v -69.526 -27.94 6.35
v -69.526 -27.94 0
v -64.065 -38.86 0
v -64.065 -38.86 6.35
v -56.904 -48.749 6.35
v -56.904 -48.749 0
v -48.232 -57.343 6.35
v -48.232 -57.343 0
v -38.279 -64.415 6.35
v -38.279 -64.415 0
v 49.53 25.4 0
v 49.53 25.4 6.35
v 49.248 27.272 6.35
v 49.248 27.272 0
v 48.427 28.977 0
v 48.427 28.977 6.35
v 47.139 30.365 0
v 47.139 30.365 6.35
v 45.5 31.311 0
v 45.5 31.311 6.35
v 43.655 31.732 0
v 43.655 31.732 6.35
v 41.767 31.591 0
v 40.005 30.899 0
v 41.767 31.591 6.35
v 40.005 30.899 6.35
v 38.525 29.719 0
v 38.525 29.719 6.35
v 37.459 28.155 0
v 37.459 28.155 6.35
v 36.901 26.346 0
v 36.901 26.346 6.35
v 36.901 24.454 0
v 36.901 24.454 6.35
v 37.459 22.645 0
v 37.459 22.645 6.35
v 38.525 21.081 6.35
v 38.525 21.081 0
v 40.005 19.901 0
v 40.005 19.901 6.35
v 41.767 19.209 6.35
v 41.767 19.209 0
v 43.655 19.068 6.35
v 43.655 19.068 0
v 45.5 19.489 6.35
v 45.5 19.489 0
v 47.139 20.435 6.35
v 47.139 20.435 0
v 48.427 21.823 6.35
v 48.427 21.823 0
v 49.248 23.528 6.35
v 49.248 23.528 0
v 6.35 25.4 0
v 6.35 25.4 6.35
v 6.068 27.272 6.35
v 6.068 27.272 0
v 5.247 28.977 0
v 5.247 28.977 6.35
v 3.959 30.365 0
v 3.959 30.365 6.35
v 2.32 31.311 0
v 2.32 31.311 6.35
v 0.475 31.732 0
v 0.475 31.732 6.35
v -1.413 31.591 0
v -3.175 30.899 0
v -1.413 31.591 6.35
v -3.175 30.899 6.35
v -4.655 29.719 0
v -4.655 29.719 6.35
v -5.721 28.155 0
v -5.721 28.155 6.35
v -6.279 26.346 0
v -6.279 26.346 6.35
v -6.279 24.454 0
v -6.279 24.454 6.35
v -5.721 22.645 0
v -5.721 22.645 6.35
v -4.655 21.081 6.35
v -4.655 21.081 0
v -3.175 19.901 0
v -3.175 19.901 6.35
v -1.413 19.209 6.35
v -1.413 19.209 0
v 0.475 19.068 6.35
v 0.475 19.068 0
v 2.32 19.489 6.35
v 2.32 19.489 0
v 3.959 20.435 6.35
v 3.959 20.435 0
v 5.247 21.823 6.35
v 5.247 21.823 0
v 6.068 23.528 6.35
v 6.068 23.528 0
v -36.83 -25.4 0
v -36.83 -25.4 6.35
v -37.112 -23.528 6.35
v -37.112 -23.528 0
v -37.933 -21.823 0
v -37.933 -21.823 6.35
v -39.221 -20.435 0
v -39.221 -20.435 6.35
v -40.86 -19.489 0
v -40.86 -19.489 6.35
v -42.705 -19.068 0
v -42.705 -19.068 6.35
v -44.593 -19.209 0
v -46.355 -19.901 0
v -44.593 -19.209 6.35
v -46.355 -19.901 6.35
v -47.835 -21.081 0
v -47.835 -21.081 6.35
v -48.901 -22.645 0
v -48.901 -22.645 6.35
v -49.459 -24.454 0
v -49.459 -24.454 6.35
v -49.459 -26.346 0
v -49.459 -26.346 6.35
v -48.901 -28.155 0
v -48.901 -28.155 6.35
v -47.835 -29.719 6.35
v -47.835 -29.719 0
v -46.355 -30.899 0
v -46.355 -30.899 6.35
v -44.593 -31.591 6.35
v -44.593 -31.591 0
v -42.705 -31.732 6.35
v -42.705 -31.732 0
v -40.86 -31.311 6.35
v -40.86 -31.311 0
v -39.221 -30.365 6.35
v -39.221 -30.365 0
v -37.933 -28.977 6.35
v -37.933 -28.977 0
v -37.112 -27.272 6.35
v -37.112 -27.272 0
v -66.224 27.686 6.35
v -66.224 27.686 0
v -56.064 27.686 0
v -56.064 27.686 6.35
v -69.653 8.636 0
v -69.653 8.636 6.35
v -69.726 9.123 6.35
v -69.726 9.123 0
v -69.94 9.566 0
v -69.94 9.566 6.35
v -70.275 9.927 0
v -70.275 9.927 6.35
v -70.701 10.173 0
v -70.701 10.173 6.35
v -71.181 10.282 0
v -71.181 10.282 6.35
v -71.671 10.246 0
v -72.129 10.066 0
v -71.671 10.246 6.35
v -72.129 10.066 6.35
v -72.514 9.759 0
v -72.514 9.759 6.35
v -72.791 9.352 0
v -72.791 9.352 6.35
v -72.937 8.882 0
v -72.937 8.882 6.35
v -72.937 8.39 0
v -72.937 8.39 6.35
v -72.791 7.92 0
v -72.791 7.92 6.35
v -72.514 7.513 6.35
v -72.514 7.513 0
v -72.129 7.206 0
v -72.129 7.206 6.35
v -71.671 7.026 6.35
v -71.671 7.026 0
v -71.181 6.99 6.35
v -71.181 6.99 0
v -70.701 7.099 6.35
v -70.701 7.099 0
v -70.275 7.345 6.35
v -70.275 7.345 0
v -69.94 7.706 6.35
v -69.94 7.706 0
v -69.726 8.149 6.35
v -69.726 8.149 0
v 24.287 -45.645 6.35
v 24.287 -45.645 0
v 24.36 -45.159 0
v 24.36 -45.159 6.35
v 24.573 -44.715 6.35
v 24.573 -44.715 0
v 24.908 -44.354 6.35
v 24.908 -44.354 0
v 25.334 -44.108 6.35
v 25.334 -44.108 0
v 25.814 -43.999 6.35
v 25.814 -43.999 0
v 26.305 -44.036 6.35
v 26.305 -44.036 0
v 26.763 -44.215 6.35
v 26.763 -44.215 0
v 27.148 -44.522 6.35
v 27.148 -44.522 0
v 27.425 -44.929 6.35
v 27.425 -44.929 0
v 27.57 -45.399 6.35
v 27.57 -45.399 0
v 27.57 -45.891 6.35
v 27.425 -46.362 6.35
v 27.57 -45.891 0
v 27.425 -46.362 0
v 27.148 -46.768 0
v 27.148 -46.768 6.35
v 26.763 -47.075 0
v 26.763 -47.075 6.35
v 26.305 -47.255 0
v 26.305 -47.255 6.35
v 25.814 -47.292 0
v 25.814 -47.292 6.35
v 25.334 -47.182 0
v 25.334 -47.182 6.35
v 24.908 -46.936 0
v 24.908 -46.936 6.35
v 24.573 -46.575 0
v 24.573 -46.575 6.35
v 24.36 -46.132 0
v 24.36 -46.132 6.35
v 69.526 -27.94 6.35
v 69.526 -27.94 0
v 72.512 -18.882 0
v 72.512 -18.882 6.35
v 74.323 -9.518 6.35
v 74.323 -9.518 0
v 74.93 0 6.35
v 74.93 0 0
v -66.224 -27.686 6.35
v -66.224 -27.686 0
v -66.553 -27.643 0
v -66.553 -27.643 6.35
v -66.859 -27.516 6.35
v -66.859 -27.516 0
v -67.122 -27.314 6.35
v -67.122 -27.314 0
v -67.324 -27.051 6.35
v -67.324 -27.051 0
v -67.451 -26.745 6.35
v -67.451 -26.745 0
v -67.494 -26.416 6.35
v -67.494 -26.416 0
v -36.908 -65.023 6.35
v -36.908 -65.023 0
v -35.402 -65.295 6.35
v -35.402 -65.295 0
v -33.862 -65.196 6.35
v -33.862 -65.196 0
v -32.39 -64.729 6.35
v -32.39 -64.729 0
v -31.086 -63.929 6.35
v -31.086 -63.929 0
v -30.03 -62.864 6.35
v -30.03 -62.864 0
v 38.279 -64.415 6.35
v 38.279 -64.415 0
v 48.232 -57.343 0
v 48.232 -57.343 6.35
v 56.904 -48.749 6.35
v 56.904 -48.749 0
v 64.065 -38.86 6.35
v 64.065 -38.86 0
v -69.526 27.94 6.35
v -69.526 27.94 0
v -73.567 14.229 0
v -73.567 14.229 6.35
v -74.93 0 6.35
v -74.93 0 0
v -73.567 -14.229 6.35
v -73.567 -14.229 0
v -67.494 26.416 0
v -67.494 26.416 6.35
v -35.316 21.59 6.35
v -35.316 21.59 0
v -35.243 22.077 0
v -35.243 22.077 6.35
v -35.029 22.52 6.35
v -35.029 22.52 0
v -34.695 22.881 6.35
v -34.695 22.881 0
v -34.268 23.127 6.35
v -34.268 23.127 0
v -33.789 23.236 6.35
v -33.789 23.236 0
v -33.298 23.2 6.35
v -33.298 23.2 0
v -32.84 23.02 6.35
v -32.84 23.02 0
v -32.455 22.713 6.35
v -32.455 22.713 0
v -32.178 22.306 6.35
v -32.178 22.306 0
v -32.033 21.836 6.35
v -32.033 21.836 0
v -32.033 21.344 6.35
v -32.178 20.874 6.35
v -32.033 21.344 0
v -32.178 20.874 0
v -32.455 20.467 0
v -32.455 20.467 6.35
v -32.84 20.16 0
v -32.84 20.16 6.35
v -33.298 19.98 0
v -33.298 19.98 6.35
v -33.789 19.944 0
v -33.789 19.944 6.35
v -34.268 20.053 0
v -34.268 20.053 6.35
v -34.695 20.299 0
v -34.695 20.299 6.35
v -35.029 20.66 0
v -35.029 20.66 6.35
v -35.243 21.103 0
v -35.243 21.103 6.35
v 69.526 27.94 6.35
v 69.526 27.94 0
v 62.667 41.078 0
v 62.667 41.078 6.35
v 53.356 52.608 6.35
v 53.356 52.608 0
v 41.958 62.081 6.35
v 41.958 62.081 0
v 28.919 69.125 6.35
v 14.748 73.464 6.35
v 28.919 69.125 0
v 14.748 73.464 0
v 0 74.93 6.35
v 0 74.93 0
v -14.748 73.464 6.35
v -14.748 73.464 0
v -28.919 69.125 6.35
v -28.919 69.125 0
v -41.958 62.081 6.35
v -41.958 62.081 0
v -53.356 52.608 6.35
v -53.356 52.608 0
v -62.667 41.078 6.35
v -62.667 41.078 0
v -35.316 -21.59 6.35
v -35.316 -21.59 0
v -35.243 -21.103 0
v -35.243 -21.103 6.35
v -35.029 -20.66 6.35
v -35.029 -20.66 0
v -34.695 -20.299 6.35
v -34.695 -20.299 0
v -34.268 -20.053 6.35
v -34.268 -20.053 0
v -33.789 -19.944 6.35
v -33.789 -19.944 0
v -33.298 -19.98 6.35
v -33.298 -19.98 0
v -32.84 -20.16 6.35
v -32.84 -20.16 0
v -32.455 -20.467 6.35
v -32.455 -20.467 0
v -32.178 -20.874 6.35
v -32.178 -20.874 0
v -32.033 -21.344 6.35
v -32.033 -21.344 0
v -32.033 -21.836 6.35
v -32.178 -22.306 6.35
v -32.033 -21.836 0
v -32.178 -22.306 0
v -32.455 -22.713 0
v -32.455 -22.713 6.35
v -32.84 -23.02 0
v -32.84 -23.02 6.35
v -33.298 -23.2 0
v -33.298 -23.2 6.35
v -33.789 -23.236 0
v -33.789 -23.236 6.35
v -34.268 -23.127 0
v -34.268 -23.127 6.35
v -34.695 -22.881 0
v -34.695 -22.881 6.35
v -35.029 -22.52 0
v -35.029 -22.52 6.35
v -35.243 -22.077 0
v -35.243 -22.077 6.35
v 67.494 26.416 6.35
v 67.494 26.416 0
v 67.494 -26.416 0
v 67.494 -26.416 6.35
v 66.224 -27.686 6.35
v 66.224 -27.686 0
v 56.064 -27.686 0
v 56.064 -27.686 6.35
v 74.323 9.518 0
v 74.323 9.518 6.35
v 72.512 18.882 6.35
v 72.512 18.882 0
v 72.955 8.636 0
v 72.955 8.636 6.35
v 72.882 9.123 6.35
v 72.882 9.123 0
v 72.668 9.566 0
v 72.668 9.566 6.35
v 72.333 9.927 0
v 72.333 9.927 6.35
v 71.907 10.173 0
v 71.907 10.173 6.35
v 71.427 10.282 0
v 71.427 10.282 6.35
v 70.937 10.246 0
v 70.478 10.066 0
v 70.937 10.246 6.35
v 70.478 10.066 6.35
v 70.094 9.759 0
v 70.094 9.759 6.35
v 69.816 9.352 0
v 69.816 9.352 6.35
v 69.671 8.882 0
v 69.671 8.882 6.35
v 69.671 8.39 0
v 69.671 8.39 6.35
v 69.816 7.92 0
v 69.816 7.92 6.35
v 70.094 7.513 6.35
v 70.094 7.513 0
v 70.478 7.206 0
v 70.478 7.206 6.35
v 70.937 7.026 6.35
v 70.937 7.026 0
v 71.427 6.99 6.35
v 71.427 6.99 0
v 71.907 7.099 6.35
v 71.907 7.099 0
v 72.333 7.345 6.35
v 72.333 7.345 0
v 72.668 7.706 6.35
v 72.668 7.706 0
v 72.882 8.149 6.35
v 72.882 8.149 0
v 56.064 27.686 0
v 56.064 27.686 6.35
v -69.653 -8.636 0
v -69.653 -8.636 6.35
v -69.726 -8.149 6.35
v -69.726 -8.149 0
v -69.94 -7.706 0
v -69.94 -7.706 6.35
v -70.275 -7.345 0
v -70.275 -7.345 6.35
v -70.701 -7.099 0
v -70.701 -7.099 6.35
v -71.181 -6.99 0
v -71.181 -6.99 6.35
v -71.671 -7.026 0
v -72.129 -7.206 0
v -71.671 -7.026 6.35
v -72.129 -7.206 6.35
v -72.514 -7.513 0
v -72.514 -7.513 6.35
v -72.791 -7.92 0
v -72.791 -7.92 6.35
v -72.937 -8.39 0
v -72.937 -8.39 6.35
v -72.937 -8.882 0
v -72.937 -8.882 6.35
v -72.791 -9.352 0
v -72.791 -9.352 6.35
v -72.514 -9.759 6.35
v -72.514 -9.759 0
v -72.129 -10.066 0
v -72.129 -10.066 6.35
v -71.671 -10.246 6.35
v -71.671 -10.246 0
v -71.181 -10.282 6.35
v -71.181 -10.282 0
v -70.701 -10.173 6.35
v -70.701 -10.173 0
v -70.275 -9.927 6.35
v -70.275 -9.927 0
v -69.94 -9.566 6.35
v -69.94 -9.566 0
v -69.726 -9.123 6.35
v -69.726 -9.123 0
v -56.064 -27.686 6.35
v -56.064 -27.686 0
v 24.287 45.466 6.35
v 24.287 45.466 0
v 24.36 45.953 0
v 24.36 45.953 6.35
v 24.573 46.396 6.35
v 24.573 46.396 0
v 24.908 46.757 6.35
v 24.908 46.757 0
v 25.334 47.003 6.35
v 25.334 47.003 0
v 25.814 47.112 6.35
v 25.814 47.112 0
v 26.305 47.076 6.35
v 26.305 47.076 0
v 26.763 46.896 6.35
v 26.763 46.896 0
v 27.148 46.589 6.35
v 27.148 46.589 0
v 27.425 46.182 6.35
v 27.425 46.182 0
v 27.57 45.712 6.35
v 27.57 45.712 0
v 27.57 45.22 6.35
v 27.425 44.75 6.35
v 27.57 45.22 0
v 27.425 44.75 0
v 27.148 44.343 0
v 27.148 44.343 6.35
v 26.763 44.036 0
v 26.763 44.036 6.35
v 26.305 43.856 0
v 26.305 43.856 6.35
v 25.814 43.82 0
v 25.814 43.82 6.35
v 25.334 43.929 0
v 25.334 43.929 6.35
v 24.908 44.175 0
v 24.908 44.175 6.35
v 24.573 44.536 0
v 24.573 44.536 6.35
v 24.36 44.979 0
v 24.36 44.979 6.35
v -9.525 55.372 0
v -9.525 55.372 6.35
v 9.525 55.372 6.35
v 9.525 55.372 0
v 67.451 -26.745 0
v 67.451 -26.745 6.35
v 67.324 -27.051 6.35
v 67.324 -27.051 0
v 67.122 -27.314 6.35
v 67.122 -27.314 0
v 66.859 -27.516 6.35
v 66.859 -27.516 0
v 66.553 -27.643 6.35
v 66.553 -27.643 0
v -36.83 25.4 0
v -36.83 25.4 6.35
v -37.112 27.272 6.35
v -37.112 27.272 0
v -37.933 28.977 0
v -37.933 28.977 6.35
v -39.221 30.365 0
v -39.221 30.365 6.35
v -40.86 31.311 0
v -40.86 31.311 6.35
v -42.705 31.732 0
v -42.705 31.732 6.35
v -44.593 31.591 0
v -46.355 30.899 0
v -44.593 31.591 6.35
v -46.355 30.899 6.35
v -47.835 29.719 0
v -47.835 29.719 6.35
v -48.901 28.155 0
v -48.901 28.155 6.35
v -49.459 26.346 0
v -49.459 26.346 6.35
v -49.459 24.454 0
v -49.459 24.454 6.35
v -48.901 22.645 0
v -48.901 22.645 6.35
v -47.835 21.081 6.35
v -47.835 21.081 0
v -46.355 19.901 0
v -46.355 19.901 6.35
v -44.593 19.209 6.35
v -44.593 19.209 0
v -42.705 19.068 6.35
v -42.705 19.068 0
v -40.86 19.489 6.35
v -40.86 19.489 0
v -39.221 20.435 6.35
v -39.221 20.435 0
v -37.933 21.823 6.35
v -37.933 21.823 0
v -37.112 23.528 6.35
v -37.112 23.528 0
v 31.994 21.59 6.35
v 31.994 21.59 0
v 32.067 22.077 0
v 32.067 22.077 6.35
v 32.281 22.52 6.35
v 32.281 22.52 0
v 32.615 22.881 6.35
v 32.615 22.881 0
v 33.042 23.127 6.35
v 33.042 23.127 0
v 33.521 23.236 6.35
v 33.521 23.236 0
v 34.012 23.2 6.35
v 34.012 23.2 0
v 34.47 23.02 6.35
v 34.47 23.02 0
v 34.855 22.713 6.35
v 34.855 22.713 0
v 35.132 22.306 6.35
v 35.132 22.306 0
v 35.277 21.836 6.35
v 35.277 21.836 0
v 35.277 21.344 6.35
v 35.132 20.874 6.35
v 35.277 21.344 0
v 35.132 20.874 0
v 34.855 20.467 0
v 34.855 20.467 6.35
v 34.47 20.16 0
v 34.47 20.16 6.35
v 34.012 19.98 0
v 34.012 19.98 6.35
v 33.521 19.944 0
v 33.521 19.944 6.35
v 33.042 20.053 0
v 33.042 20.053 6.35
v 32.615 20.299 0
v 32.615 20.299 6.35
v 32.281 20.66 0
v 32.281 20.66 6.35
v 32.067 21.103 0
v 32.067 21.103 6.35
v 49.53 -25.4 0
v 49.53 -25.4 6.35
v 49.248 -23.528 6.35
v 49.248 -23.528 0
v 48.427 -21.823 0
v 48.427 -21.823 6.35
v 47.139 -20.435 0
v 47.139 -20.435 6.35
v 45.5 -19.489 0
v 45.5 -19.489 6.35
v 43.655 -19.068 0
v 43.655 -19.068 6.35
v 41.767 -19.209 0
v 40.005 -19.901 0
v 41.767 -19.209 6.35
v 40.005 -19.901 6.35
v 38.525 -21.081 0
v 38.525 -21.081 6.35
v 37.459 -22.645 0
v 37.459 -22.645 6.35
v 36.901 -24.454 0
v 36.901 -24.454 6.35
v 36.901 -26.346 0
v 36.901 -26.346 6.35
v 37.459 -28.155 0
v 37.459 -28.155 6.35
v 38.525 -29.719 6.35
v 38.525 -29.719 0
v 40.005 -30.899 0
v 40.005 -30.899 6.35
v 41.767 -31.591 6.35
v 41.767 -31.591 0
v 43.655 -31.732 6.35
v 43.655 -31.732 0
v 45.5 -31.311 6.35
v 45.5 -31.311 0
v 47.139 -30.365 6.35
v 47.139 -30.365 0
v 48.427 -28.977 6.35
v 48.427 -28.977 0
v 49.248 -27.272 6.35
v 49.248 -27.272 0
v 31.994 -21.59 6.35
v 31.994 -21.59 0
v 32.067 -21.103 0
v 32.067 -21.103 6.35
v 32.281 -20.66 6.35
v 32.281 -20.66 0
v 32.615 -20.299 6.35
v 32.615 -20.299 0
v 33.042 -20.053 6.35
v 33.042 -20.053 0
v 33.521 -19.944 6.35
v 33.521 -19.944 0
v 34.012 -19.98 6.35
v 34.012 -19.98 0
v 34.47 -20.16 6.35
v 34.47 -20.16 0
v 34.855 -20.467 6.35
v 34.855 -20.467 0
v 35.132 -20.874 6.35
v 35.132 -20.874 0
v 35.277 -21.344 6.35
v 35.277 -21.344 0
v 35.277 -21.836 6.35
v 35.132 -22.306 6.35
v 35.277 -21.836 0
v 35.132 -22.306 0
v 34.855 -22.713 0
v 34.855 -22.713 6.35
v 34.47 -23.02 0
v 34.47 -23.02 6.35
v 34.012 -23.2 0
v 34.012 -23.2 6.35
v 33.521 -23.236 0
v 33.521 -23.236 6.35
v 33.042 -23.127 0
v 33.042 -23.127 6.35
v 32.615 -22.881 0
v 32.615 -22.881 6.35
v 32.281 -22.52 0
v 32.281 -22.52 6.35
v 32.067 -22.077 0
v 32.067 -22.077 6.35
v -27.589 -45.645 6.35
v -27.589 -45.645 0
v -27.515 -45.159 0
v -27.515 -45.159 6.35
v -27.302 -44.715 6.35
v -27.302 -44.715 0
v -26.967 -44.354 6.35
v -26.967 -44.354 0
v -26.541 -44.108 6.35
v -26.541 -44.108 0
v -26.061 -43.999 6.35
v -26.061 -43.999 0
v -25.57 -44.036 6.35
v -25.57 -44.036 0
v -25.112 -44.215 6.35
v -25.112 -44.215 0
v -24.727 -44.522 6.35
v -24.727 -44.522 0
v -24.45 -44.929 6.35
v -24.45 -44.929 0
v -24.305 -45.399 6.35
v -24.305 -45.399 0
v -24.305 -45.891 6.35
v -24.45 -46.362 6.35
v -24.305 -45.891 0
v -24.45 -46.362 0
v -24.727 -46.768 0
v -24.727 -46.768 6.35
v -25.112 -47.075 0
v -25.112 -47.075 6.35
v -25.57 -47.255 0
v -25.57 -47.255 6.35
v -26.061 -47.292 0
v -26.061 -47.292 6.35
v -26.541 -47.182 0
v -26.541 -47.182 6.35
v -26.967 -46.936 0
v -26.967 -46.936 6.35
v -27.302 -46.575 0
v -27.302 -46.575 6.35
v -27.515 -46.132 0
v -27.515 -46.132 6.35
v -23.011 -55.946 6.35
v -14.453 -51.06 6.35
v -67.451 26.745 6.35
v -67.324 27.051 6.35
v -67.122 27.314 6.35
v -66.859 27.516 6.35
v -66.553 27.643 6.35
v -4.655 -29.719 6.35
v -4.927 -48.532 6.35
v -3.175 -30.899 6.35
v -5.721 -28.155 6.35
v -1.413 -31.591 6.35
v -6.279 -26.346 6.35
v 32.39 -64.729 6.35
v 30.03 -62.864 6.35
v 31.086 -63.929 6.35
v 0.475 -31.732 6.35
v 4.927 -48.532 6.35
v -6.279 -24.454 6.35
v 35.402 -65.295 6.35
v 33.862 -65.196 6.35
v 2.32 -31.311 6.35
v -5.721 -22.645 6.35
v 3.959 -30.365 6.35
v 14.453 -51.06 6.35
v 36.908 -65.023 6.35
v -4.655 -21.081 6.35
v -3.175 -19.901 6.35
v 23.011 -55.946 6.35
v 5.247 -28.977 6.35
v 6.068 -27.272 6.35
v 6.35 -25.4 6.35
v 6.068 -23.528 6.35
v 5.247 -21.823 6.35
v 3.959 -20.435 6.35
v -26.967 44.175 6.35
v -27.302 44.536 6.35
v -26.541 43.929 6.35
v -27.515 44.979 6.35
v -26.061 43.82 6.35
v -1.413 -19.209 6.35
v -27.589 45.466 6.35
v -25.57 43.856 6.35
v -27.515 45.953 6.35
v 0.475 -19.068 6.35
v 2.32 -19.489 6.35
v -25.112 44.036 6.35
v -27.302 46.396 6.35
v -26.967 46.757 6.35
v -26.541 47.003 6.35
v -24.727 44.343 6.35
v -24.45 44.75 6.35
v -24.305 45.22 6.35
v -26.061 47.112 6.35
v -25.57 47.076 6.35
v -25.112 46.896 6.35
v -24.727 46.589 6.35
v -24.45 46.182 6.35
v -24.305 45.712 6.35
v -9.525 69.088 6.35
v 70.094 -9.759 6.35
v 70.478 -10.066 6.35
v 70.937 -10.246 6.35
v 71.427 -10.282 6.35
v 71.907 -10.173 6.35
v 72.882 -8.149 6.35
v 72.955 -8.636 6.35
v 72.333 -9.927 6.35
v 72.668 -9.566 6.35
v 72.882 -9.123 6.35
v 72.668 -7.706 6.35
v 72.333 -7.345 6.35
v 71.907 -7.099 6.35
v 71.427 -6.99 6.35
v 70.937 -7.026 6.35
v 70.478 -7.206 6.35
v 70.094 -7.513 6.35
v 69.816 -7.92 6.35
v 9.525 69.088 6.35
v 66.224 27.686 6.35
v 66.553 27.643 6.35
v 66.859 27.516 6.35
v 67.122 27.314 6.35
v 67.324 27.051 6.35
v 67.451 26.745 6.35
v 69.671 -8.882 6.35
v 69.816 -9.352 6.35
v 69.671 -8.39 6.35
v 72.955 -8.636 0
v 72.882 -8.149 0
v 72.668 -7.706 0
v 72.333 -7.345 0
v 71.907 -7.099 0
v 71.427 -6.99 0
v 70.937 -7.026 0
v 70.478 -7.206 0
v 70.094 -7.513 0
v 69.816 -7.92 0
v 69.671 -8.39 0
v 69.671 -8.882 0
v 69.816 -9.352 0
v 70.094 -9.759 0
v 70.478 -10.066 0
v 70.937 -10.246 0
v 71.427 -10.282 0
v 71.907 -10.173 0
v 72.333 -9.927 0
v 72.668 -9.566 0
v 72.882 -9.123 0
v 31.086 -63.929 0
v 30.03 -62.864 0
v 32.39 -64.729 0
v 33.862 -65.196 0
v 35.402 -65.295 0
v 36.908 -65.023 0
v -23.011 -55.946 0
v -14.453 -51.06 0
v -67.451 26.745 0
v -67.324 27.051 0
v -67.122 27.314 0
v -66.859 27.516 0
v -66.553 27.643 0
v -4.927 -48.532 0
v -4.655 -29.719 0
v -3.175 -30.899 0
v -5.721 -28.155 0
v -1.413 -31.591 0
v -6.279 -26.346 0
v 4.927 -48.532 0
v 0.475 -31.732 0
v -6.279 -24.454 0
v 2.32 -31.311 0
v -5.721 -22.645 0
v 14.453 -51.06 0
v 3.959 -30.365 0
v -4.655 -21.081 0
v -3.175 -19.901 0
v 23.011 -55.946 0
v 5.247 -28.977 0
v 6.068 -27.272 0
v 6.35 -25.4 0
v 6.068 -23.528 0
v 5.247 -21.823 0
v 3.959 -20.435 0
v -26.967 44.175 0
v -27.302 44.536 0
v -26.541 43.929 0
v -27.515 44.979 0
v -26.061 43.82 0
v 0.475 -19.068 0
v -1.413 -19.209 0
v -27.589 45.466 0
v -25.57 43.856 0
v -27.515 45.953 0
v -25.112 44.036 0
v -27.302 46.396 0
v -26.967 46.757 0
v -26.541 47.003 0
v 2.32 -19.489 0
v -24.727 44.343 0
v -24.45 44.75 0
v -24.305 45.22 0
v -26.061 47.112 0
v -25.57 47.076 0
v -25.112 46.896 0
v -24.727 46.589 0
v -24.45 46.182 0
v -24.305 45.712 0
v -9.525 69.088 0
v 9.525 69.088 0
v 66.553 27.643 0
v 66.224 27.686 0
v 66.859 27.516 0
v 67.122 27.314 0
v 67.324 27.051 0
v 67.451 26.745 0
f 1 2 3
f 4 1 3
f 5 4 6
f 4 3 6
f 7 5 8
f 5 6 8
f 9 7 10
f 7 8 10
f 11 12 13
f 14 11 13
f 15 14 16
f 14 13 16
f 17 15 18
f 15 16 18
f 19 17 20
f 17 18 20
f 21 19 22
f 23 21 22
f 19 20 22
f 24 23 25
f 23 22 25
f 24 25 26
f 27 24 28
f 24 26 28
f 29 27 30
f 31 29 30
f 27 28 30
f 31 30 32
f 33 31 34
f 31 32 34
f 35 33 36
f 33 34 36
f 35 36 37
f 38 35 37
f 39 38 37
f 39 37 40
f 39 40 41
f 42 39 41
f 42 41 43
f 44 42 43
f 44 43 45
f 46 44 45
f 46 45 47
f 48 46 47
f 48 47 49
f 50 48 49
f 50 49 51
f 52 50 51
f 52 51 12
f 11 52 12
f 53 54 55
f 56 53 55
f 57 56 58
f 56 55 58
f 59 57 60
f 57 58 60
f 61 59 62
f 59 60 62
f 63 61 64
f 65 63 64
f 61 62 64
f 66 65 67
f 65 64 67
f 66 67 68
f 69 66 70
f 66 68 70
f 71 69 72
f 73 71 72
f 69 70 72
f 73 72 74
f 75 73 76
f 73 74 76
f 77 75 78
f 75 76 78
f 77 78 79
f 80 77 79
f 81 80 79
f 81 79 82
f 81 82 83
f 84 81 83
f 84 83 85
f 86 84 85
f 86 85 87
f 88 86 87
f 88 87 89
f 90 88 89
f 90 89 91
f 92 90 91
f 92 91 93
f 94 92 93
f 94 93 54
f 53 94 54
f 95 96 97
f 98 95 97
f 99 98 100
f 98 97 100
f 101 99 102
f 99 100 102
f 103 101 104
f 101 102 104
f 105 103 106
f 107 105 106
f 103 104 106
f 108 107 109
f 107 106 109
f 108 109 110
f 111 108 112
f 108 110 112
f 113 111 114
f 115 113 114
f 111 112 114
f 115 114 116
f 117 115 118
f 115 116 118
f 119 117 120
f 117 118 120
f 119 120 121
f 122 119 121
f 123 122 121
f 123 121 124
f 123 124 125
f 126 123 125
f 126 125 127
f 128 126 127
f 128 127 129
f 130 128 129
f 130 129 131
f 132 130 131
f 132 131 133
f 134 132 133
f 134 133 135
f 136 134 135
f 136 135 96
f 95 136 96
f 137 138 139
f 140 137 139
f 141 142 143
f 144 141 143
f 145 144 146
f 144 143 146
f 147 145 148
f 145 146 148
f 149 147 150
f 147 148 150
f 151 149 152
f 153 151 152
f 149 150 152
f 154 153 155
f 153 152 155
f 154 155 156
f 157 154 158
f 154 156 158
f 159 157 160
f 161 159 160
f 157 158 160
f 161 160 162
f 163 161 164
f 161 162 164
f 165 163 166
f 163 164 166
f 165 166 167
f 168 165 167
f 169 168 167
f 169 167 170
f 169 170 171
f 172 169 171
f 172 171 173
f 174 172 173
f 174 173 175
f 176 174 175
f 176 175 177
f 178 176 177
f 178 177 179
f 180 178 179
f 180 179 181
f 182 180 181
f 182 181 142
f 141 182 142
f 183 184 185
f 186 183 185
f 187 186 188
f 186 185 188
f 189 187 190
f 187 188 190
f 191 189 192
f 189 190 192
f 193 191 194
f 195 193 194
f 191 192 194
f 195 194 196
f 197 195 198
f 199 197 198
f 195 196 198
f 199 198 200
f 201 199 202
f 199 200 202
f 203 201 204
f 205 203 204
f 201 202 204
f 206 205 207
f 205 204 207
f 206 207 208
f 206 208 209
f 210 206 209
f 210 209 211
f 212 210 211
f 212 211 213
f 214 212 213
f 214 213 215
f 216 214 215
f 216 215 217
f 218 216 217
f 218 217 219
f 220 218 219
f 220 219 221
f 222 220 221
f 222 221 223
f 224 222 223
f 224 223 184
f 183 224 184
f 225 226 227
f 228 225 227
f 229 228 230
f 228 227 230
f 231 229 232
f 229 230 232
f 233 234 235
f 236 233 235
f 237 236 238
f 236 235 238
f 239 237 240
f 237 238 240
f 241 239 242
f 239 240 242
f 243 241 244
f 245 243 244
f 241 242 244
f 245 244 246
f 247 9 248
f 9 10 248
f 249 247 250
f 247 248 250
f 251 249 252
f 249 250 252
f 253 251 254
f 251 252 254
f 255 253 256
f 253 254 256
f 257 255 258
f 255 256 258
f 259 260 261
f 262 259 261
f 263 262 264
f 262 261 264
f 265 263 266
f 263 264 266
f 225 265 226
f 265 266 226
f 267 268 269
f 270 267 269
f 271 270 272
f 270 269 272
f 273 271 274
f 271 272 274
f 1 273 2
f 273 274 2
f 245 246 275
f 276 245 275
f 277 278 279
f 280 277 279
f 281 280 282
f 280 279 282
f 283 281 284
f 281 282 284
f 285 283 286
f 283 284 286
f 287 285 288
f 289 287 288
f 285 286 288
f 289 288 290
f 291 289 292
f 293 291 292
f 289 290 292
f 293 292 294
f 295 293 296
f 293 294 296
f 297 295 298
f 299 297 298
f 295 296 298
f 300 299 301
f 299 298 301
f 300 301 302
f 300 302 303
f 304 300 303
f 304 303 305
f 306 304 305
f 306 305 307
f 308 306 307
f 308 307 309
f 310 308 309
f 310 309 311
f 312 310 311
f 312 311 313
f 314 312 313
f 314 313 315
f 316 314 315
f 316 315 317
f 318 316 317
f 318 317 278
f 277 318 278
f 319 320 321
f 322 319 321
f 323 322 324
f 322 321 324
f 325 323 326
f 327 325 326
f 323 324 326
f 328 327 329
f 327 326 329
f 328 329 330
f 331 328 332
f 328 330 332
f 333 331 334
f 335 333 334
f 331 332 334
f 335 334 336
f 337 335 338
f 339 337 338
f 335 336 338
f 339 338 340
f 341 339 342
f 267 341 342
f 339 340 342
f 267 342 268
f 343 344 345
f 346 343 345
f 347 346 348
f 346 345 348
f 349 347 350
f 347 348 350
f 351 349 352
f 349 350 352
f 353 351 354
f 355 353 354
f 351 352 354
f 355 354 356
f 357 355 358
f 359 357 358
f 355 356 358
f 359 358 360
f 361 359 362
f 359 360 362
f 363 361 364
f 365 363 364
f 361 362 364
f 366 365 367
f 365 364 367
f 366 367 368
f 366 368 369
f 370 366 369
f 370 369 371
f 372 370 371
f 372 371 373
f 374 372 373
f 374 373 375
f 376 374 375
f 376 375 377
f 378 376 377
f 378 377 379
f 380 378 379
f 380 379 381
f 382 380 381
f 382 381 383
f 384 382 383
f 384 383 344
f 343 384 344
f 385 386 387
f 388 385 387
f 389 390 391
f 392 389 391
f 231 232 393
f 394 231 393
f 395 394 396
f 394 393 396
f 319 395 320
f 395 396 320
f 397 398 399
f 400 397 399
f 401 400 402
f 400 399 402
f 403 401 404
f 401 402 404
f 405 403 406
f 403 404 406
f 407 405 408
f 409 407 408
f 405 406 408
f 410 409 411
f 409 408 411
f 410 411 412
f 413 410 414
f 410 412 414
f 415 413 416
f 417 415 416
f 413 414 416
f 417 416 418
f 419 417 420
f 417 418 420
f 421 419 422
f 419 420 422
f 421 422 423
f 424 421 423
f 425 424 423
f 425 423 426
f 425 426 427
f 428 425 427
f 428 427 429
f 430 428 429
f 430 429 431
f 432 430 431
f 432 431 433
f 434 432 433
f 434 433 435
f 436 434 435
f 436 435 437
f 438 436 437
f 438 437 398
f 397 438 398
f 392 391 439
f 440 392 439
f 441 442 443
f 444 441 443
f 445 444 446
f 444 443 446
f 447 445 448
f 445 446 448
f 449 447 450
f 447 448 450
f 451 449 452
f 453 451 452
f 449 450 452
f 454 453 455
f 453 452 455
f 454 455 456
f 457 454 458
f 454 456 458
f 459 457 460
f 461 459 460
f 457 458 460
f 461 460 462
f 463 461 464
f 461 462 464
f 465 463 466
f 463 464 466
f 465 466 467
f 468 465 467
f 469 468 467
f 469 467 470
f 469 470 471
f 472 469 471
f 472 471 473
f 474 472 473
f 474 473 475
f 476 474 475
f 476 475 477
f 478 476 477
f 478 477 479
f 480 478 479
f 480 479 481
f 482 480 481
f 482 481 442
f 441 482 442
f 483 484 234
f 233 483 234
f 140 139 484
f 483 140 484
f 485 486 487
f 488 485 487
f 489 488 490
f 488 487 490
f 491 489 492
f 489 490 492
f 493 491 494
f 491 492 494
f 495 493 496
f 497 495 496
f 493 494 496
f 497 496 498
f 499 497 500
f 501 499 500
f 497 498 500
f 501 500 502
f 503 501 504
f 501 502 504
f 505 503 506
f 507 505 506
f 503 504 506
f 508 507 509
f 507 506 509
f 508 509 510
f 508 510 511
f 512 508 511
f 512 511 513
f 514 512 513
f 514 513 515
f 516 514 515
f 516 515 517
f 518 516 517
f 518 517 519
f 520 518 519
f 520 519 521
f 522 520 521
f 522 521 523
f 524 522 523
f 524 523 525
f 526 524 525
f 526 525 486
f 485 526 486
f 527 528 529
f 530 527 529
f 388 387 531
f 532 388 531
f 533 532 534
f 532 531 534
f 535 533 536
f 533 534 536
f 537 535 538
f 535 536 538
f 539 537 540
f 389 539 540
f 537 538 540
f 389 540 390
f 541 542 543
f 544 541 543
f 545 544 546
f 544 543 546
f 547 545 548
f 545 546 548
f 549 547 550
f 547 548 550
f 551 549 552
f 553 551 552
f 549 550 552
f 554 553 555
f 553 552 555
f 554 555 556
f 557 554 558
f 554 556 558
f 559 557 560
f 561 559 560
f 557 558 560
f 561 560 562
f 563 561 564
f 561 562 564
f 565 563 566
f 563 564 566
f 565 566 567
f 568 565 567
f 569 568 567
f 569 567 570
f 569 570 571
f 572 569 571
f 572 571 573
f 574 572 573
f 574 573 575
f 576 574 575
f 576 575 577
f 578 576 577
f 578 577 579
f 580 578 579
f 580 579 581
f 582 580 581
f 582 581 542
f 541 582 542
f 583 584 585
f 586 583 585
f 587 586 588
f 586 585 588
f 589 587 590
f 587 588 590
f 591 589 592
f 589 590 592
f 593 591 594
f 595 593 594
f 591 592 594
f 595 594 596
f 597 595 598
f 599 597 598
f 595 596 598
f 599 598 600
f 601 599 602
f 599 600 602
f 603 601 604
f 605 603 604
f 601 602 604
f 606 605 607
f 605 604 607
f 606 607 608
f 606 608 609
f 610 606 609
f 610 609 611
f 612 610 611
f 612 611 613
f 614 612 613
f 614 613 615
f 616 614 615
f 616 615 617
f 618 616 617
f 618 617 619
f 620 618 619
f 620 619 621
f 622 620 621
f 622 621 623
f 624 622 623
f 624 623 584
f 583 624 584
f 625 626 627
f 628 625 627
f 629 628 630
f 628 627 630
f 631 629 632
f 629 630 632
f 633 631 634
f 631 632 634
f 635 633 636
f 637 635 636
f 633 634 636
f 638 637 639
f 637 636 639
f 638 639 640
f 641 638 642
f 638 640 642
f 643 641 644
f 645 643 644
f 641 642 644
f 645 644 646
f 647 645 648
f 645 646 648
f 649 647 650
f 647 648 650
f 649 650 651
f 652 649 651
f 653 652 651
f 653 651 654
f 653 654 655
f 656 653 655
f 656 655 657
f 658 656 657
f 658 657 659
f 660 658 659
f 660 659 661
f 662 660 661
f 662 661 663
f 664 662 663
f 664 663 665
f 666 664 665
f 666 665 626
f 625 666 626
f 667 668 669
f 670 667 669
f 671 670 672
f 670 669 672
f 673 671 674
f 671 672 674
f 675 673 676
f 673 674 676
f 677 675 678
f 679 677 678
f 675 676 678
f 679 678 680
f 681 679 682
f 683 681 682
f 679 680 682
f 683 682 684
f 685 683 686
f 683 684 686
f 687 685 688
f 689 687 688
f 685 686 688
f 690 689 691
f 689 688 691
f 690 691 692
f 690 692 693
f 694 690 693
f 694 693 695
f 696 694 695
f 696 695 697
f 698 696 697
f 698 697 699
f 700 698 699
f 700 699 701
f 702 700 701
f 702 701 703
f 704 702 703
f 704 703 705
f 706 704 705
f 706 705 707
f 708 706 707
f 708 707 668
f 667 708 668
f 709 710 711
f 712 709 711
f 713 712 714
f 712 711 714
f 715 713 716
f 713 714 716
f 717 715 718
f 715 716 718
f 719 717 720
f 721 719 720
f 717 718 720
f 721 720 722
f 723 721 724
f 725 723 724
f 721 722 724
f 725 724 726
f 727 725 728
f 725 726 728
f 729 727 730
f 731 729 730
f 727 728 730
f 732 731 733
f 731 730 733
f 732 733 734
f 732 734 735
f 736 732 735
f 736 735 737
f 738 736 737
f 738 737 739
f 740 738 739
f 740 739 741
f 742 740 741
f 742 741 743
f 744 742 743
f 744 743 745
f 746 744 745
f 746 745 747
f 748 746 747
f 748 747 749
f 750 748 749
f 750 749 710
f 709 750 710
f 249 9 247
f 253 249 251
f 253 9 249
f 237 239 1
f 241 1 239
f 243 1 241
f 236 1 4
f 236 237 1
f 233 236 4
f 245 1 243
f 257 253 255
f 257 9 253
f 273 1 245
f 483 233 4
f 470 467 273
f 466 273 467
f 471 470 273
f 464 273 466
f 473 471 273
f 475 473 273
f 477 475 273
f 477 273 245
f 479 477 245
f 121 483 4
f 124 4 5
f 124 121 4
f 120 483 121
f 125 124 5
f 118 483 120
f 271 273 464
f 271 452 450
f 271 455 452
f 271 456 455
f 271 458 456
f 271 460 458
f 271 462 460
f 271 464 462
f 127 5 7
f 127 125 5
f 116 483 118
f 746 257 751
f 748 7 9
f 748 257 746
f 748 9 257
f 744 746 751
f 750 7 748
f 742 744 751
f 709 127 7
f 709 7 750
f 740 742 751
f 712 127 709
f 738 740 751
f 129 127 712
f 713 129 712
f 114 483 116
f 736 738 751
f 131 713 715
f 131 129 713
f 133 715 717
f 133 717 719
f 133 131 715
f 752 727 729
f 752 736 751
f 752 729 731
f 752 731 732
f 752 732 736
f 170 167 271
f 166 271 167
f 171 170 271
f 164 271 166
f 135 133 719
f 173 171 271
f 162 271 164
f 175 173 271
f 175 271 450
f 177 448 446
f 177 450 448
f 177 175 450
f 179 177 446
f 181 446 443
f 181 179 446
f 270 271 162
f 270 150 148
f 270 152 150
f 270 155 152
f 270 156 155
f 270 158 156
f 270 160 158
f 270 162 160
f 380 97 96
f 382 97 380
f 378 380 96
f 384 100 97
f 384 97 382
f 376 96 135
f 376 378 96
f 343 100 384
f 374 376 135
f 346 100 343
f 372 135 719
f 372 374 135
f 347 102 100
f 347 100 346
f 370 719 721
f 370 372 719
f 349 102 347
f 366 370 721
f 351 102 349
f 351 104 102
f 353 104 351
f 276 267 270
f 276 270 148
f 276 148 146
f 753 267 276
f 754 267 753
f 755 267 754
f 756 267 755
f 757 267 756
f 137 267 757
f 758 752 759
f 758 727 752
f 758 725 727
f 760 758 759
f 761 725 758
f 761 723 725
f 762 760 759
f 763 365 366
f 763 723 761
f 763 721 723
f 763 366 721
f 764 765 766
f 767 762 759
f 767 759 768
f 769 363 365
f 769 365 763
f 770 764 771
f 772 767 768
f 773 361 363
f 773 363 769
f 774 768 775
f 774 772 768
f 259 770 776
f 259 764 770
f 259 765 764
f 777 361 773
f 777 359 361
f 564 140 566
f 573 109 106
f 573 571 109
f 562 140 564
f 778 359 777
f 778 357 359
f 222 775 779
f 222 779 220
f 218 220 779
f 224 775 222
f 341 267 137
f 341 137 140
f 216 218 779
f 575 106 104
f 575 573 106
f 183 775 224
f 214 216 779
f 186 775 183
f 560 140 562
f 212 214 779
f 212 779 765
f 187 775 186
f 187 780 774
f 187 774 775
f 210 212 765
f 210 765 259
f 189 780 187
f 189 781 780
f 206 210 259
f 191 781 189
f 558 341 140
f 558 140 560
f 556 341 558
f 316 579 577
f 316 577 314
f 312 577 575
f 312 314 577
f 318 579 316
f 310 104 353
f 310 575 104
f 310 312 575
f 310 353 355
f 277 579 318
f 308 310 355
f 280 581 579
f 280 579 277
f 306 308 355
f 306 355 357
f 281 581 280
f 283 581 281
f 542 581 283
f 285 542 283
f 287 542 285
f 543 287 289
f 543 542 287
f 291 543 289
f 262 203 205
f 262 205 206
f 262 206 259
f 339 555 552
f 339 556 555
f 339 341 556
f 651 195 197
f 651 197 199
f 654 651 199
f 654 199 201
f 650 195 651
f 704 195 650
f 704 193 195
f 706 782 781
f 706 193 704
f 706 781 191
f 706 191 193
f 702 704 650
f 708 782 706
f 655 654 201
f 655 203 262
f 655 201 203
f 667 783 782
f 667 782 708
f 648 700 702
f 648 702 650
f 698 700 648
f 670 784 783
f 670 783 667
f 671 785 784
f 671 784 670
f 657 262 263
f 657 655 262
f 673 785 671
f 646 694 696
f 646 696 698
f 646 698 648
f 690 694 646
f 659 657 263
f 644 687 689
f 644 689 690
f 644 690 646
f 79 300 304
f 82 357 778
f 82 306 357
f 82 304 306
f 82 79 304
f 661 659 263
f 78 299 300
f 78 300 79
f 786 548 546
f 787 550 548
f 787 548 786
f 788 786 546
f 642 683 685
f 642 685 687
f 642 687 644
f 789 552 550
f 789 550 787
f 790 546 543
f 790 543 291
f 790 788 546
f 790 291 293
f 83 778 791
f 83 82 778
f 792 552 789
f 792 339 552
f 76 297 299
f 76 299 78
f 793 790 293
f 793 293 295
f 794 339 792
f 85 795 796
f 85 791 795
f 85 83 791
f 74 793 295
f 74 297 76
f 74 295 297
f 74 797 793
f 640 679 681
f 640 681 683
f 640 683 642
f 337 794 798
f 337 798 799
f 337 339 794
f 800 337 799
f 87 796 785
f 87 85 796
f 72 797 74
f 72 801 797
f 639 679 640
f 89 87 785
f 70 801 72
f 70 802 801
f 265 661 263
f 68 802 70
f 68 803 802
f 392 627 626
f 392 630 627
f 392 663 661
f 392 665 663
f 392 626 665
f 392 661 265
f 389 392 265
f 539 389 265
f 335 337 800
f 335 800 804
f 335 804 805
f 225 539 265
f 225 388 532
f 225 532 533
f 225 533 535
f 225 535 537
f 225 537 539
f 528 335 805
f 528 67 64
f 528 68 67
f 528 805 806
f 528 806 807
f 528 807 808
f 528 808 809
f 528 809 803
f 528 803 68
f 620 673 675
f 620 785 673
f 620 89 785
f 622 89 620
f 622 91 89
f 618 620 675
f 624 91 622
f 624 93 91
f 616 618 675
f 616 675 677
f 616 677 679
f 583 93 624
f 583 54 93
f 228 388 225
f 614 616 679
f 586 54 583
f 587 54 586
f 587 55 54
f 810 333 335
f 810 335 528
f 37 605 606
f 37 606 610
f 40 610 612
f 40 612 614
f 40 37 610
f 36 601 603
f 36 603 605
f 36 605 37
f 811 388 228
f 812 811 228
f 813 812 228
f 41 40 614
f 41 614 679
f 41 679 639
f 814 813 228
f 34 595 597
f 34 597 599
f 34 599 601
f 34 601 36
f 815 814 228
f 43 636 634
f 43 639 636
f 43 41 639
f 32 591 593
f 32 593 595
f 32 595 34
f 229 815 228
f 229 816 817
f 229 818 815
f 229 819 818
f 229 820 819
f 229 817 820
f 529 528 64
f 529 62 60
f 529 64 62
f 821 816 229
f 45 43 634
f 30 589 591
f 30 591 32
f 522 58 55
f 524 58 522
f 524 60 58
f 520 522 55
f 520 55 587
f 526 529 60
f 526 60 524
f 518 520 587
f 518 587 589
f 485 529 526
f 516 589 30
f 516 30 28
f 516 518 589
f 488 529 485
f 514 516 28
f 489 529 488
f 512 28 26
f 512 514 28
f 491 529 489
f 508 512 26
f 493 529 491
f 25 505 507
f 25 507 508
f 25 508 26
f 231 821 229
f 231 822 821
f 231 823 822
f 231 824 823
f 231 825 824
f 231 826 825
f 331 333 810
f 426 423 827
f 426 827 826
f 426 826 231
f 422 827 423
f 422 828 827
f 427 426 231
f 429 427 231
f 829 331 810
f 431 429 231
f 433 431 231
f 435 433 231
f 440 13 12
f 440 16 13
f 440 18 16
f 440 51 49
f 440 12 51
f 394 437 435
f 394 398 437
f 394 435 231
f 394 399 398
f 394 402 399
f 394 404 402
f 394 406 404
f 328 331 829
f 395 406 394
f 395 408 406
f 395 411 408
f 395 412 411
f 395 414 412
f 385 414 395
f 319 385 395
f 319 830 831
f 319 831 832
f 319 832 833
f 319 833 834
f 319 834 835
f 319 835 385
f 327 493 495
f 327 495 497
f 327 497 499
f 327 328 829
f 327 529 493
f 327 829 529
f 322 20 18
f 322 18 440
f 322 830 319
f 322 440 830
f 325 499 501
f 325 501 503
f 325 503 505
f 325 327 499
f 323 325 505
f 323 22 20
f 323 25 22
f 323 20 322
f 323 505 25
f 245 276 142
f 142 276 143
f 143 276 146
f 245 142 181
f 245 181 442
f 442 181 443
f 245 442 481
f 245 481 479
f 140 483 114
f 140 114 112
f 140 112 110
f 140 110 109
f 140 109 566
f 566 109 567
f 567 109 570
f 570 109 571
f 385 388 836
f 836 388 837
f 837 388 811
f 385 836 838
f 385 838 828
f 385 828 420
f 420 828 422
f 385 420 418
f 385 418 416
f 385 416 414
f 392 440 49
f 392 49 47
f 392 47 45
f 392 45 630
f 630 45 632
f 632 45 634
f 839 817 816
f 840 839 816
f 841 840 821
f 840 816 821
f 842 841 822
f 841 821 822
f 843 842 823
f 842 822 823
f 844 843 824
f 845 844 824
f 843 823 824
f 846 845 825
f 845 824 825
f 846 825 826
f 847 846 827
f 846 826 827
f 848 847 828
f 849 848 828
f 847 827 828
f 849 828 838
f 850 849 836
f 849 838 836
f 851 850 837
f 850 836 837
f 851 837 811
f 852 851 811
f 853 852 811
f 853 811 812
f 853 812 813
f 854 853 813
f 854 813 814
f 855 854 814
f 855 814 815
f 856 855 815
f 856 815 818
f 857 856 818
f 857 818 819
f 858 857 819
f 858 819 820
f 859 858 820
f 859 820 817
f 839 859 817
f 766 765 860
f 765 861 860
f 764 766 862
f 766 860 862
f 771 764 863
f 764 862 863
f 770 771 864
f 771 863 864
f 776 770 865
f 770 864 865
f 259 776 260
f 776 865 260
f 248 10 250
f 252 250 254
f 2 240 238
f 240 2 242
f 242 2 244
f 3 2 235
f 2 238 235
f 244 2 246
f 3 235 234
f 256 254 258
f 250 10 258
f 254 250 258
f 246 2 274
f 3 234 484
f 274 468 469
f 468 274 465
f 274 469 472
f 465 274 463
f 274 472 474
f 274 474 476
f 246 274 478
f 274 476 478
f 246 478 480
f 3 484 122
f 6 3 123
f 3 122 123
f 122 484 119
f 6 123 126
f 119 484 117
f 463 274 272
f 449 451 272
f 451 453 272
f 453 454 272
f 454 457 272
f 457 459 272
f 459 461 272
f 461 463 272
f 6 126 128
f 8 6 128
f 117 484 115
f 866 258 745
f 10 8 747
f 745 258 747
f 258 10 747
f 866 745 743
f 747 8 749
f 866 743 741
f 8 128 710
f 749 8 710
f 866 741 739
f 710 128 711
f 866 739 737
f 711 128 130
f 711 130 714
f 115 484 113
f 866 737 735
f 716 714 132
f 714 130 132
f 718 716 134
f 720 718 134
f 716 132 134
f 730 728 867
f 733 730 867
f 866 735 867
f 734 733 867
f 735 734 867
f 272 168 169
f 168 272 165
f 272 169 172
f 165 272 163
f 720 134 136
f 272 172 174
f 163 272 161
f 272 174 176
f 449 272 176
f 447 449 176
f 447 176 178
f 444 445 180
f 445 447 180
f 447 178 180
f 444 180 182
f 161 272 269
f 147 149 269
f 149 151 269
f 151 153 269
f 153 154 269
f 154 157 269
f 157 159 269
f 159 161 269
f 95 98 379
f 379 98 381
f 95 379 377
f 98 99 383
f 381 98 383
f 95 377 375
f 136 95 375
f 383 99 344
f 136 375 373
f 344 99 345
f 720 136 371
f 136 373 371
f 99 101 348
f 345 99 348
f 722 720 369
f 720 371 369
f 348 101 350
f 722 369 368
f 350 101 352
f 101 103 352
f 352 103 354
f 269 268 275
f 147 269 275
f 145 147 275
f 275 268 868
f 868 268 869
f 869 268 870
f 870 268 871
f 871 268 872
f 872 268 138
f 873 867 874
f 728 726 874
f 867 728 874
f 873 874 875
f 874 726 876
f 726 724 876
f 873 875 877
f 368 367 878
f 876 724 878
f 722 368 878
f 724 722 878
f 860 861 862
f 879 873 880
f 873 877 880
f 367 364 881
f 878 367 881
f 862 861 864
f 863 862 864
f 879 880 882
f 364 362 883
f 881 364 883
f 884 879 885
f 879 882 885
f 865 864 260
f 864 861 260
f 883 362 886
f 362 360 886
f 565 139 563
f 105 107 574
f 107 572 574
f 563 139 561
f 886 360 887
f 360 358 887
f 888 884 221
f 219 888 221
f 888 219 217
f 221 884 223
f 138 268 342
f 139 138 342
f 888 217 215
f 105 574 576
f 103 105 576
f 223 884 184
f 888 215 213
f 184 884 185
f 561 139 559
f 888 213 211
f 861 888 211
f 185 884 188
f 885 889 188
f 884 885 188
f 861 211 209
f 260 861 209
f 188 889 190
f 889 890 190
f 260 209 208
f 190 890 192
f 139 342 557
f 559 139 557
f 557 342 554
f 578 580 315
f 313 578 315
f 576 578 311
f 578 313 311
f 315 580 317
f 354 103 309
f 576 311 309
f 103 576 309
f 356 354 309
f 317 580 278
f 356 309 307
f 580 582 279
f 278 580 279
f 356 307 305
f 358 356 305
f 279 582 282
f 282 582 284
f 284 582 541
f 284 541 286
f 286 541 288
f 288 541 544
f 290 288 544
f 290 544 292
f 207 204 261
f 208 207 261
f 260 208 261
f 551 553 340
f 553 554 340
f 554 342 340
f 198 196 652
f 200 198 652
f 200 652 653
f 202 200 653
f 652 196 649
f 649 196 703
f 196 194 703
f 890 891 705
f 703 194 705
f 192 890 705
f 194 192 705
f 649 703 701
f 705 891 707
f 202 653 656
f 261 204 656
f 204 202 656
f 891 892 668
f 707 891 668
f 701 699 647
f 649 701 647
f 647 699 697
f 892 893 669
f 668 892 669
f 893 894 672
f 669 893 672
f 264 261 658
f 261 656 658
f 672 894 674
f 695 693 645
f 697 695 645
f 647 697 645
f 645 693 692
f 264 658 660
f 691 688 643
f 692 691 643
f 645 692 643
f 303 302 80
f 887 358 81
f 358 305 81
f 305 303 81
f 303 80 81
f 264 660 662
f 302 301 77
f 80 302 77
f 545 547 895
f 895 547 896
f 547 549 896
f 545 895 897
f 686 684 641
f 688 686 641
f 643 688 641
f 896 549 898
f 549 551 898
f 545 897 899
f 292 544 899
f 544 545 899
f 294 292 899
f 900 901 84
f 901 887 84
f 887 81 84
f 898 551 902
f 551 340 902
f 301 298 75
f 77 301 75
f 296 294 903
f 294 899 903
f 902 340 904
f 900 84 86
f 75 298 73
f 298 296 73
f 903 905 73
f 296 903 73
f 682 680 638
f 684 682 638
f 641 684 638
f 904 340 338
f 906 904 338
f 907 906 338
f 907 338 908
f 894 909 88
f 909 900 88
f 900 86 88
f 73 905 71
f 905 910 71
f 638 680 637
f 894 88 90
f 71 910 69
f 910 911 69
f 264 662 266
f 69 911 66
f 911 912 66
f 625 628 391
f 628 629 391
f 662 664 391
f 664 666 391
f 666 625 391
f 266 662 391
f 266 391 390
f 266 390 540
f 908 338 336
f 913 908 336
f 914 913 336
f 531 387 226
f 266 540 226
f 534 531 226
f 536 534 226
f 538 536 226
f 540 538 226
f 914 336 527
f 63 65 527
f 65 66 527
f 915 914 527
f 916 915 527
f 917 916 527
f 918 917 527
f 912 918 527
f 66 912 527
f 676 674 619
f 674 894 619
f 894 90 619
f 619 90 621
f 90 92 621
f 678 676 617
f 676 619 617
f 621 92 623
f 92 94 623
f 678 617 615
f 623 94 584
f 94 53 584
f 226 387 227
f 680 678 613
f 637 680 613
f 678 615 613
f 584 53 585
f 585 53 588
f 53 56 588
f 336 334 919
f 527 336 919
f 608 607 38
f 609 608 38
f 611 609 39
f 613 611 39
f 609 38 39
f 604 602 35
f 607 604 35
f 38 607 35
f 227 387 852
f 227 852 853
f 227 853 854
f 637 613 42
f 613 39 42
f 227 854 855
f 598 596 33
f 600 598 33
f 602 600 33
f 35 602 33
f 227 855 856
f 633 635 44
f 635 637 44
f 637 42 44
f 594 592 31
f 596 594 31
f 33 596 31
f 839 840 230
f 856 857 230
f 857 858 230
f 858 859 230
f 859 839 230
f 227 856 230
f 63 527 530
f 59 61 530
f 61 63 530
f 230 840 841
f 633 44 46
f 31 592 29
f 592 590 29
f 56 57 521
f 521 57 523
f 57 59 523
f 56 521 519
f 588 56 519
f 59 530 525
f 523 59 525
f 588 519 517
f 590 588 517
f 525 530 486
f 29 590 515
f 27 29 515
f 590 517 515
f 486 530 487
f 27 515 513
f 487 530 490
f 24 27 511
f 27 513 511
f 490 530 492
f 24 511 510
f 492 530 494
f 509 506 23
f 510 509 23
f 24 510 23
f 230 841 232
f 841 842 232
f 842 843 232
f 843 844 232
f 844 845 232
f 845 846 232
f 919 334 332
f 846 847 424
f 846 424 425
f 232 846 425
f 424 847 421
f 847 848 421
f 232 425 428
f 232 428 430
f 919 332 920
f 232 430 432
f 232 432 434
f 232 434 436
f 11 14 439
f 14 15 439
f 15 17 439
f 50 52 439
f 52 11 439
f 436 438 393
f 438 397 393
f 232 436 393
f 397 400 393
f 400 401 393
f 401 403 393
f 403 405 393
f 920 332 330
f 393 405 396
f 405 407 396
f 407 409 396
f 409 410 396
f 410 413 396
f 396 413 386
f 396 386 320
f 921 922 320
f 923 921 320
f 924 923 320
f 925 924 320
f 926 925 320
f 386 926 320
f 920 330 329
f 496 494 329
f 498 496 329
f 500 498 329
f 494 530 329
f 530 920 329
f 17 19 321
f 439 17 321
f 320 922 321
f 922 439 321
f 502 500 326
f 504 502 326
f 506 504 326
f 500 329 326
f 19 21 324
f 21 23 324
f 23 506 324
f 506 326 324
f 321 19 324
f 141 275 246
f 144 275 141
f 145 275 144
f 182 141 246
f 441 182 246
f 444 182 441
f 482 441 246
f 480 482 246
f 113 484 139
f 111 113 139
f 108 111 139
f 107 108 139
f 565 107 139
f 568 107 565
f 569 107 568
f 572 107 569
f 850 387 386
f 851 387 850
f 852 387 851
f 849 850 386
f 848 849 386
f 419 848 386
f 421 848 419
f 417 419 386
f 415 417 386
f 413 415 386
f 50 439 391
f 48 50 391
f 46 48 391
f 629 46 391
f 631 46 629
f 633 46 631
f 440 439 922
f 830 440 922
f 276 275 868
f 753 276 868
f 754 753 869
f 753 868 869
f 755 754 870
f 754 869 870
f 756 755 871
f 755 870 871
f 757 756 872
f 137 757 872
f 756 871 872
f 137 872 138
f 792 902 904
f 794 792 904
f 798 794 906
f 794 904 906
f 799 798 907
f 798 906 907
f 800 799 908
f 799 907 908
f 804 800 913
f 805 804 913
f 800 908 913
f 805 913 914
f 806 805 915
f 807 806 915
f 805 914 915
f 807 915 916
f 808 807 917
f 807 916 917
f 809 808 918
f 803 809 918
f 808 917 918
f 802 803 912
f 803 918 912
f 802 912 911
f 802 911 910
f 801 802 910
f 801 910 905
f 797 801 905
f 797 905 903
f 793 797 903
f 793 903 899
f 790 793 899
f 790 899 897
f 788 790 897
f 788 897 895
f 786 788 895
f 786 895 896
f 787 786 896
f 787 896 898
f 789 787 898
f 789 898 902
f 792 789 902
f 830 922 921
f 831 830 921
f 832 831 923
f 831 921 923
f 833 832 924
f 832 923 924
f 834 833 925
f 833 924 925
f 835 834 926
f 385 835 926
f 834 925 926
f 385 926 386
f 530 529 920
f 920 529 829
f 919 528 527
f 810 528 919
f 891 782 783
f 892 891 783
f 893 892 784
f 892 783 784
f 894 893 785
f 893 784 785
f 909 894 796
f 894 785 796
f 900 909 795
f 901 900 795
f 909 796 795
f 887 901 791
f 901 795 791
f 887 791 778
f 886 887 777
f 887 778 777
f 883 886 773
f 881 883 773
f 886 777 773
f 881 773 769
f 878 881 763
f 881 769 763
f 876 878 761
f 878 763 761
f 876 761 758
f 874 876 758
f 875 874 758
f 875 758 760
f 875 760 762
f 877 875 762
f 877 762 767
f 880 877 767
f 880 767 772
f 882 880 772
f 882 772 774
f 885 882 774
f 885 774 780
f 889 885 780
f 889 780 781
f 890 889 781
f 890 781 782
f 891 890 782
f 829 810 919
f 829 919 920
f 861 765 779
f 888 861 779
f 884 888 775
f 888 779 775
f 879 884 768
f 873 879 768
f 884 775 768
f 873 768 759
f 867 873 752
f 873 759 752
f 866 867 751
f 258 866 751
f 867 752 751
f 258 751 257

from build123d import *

# Parameters (mm, degrees)
BOSS_EXTRUDE2_DEPTH     = 6.35
SKETCH2_W               = 19.05
SKETCH2_H               = 13.716
CUT_EXTRUDE1_DEPTH      = 7.35
SKETCH3_R               = 38.1
CUT_EXTRUDE2_DEPTH      = 7.35
FILLET1_R               = 6.35
SKETCH7_R               = 3.175
CUT_EXTRUDE6_DEPTH      = 103.378
CUT_EXTRUDE6_DEPTH_BACK = 1.0000001
SKETCH8_R               = 1.651
CUT_EXTRUDE7_DEPTH      = 75.692
SKETCH10_R              = 1.651
CUT_EXTRUDE9_DEPTH      = 97.79
SKETCH11_R              = 1.651
CUT_EXTRUDE10_DEPTH     = 150.876
SKETCH12_R              = 6.35
CUT_EXTRUDE11_DEPTH     = 31.242


with BuildPart() as part:
    # Sketch1 → Boss-Extrude2 (new body)
    with BuildSketch(Plane.XY):
        with BuildLine():
            ThreePointArc((-69.525975721, 27.94), (-74.93, 0), (-69.525975721, -27.94))
            ThreePointArc((-69.525975721, -27.94), (0, -74.93), (69.525975721, -27.94))
            ThreePointArc((69.525975721, -27.94), (73.56658977, -14.228906128), (74.93, 0))
            ThreePointArc((74.93, 0), (73.56658977, 14.228906128), (69.525975721, 27.94))
            ThreePointArc((69.525975721, 27.94), (0, 74.93), (-69.525975721, 27.94))
        make_face()
        with BuildLine():
            ThreePointArc((-67.493975721, 26.416), (-67.122001333, 27.314025612), (-66.223975721, 27.686))
            Line((-66.223975721, 27.686), (-56.063975721, 27.686))
            Line((-56.063975721, 27.686), (-56.063975721, -27.686))
            Line((-56.063975721, -27.686), (-66.223975721, -27.686))
            ThreePointArc((-66.223975721, -27.686), (-67.122001333, -27.314025612), (-67.493975721, -26.416))
            Line((-67.493975721, -26.416), (-67.493975721, 26.416))
        make_face(mode=Mode.SUBTRACT)
        with BuildLine():
            ThreePointArc((66.223975721, 27.686), (67.122001333, 27.314025612), (67.493975721, 26.416))
            Line((67.493975721, 26.416), (67.493975721, -26.416))
            ThreePointArc((67.493975721, -26.416), (67.122001333, -27.314025612), (66.223975721, -27.686))
            Line((66.223975721, -27.686), (56.063975721, -27.686))
            Line((56.063975721, -27.686), (56.063975721, 27.686))
            Line((56.063975721, 27.686), (66.223975721, 27.686))
        make_face(mode=Mode.SUBTRACT)
    extrude(amount=BOSS_EXTRUDE2_DEPTH)

    # Sketch2 → Cut-Extrude1 (cut, through all)
    with BuildSketch(Plane.XY.offset(6.35)):
        with Locations((0, 62.23)):
            Rectangle(SKETCH2_W, SKETCH2_H)
    extrude(amount=-CUT_EXTRUDE1_DEPTH, mode=Mode.SUBTRACT)

    # Sketch3 → Cut-Extrude2 (cut, through all)
    with BuildSketch(Plane.XY.offset(6.35)):
        with Locations((0, -86.312058398)):
            Circle(SKETCH3_R)
    extrude(amount=-CUT_EXTRUDE2_DEPTH, mode=Mode.SUBTRACT)

    # Fillet1
    fillet1_edges = [part.edges().sort_by_distance(p)[0] for p in [
        (-33.000960548, -67.271401821, 3.175),
        (33.000960548, -67.271401821, 3.175),
    ]]
    fillet(fillet1_edges, radius=FILLET1_R)

    # Sketch7 → Cut-Extrude6 (cut, two sides)
    with BuildSketch(Plane(origin=(30.092005081, 4.08352975, 6.35), x_dir=(-1, 0, 0), z_dir=(0, 0, -1))) as cut_extrude6_sk:
        with Locations((-13.087994919, 21.31647025)):
            Circle(SKETCH7_R)
        with Locations((73.272005081, 21.31647025)):
            Circle(SKETCH7_R)
        with Locations((30.092005081, 21.31647025)):
            Circle(SKETCH7_R)
        with Locations((73.272005081, -29.48352975)):
            Circle(SKETCH7_R)
        with Locations((30.092005081, -29.48352975)):
            Circle(SKETCH7_R)
        with Locations((-13.087994919, -29.48352975)):
            Circle(SKETCH7_R)
    extrude(amount=CUT_EXTRUDE6_DEPTH, mode=Mode.SUBTRACT)
    extrude(cut_extrude6_sk.sketch, amount=-CUT_EXTRUDE6_DEPTH_BACK, mode=Mode.SUBTRACT)

    # Sketch8 → Cut-Extrude7 (cut)
    with BuildSketch(Plane(origin=(30.092005081, 4.08352975, -35.052), x_dir=(-1, 0, 0), z_dir=(0, 0, -1))):
        with Locations((63.757223581, 17.50647025)):
            Circle(SKETCH8_R)
        with Locations((63.757223581, -25.67352975)):
            Circle(SKETCH8_R)
        with Locations((-3.552776419, -25.67352975)):
            Circle(SKETCH8_R)
        with Locations((-3.552776419, 17.50647025)):
            Circle(SKETCH8_R)
    extrude(amount=-CUT_EXTRUDE7_DEPTH, mode=Mode.SUBTRACT)

    # Sketch10 → Cut-Extrude9 (cut)
    with BuildSketch(Plane(origin=(30.092005081, 4.08352975, -41.275), x_dir=(-1, 0, 0), z_dir=(0, 0, -1))):
        with Locations((4.154396091, -49.728759131)):
            Circle(SKETCH10_R)
        with Locations((56.02961407, -49.728759131)):
            Circle(SKETCH10_R)
        with Locations((4.154396091, 41.38247025)):
            Circle(SKETCH10_R)
        with Locations((56.02961407, 41.38247025)):
            Circle(SKETCH10_R)
    extrude(amount=-CUT_EXTRUDE9_DEPTH, mode=Mode.SUBTRACT)

    # Sketch11 → Cut-Extrude10 (cut)
    with BuildSketch(Plane(origin=(30.092005081, 4.08352975, 6.35), x_dir=(1, 0, 0), z_dir=(0, 0, 1))):
        with Locations((-101.395980802, -12.71952975)):
            Circle(SKETCH11_R)
        with Locations((-101.395980802, 4.55247025)):
            Circle(SKETCH11_R)
        with Locations((41.211970641, -12.71952975)):
            Circle(SKETCH11_R)
        with Locations((41.211970641, 4.55247025)):
            Circle(SKETCH11_R)
    extrude(amount=-CUT_EXTRUDE10_DEPTH, mode=Mode.SUBTRACT)

    # Sketch12 → Cut-Extrude11 (cut)
    with BuildSketch(Plane.XY.offset(6.35)):
        with Locations((0, 25.4)):
            Circle(SKETCH12_R)
        with Locations((-43.18, 25.4)):
            Circle(SKETCH12_R)
        with Locations((-43.18, -25.4)):
            Circle(SKETCH12_R)
        with Locations((0, -25.4)):
            Circle(SKETCH12_R)
        with Locations((43.18, -25.4)):
            Circle(SKETCH12_R)
        with Locations((43.18, 25.4)):
            Circle(SKETCH12_R)
    extrude(amount=-CUT_EXTRUDE11_DEPTH, mode=Mode.SUBTRACT)


solid = part.part
